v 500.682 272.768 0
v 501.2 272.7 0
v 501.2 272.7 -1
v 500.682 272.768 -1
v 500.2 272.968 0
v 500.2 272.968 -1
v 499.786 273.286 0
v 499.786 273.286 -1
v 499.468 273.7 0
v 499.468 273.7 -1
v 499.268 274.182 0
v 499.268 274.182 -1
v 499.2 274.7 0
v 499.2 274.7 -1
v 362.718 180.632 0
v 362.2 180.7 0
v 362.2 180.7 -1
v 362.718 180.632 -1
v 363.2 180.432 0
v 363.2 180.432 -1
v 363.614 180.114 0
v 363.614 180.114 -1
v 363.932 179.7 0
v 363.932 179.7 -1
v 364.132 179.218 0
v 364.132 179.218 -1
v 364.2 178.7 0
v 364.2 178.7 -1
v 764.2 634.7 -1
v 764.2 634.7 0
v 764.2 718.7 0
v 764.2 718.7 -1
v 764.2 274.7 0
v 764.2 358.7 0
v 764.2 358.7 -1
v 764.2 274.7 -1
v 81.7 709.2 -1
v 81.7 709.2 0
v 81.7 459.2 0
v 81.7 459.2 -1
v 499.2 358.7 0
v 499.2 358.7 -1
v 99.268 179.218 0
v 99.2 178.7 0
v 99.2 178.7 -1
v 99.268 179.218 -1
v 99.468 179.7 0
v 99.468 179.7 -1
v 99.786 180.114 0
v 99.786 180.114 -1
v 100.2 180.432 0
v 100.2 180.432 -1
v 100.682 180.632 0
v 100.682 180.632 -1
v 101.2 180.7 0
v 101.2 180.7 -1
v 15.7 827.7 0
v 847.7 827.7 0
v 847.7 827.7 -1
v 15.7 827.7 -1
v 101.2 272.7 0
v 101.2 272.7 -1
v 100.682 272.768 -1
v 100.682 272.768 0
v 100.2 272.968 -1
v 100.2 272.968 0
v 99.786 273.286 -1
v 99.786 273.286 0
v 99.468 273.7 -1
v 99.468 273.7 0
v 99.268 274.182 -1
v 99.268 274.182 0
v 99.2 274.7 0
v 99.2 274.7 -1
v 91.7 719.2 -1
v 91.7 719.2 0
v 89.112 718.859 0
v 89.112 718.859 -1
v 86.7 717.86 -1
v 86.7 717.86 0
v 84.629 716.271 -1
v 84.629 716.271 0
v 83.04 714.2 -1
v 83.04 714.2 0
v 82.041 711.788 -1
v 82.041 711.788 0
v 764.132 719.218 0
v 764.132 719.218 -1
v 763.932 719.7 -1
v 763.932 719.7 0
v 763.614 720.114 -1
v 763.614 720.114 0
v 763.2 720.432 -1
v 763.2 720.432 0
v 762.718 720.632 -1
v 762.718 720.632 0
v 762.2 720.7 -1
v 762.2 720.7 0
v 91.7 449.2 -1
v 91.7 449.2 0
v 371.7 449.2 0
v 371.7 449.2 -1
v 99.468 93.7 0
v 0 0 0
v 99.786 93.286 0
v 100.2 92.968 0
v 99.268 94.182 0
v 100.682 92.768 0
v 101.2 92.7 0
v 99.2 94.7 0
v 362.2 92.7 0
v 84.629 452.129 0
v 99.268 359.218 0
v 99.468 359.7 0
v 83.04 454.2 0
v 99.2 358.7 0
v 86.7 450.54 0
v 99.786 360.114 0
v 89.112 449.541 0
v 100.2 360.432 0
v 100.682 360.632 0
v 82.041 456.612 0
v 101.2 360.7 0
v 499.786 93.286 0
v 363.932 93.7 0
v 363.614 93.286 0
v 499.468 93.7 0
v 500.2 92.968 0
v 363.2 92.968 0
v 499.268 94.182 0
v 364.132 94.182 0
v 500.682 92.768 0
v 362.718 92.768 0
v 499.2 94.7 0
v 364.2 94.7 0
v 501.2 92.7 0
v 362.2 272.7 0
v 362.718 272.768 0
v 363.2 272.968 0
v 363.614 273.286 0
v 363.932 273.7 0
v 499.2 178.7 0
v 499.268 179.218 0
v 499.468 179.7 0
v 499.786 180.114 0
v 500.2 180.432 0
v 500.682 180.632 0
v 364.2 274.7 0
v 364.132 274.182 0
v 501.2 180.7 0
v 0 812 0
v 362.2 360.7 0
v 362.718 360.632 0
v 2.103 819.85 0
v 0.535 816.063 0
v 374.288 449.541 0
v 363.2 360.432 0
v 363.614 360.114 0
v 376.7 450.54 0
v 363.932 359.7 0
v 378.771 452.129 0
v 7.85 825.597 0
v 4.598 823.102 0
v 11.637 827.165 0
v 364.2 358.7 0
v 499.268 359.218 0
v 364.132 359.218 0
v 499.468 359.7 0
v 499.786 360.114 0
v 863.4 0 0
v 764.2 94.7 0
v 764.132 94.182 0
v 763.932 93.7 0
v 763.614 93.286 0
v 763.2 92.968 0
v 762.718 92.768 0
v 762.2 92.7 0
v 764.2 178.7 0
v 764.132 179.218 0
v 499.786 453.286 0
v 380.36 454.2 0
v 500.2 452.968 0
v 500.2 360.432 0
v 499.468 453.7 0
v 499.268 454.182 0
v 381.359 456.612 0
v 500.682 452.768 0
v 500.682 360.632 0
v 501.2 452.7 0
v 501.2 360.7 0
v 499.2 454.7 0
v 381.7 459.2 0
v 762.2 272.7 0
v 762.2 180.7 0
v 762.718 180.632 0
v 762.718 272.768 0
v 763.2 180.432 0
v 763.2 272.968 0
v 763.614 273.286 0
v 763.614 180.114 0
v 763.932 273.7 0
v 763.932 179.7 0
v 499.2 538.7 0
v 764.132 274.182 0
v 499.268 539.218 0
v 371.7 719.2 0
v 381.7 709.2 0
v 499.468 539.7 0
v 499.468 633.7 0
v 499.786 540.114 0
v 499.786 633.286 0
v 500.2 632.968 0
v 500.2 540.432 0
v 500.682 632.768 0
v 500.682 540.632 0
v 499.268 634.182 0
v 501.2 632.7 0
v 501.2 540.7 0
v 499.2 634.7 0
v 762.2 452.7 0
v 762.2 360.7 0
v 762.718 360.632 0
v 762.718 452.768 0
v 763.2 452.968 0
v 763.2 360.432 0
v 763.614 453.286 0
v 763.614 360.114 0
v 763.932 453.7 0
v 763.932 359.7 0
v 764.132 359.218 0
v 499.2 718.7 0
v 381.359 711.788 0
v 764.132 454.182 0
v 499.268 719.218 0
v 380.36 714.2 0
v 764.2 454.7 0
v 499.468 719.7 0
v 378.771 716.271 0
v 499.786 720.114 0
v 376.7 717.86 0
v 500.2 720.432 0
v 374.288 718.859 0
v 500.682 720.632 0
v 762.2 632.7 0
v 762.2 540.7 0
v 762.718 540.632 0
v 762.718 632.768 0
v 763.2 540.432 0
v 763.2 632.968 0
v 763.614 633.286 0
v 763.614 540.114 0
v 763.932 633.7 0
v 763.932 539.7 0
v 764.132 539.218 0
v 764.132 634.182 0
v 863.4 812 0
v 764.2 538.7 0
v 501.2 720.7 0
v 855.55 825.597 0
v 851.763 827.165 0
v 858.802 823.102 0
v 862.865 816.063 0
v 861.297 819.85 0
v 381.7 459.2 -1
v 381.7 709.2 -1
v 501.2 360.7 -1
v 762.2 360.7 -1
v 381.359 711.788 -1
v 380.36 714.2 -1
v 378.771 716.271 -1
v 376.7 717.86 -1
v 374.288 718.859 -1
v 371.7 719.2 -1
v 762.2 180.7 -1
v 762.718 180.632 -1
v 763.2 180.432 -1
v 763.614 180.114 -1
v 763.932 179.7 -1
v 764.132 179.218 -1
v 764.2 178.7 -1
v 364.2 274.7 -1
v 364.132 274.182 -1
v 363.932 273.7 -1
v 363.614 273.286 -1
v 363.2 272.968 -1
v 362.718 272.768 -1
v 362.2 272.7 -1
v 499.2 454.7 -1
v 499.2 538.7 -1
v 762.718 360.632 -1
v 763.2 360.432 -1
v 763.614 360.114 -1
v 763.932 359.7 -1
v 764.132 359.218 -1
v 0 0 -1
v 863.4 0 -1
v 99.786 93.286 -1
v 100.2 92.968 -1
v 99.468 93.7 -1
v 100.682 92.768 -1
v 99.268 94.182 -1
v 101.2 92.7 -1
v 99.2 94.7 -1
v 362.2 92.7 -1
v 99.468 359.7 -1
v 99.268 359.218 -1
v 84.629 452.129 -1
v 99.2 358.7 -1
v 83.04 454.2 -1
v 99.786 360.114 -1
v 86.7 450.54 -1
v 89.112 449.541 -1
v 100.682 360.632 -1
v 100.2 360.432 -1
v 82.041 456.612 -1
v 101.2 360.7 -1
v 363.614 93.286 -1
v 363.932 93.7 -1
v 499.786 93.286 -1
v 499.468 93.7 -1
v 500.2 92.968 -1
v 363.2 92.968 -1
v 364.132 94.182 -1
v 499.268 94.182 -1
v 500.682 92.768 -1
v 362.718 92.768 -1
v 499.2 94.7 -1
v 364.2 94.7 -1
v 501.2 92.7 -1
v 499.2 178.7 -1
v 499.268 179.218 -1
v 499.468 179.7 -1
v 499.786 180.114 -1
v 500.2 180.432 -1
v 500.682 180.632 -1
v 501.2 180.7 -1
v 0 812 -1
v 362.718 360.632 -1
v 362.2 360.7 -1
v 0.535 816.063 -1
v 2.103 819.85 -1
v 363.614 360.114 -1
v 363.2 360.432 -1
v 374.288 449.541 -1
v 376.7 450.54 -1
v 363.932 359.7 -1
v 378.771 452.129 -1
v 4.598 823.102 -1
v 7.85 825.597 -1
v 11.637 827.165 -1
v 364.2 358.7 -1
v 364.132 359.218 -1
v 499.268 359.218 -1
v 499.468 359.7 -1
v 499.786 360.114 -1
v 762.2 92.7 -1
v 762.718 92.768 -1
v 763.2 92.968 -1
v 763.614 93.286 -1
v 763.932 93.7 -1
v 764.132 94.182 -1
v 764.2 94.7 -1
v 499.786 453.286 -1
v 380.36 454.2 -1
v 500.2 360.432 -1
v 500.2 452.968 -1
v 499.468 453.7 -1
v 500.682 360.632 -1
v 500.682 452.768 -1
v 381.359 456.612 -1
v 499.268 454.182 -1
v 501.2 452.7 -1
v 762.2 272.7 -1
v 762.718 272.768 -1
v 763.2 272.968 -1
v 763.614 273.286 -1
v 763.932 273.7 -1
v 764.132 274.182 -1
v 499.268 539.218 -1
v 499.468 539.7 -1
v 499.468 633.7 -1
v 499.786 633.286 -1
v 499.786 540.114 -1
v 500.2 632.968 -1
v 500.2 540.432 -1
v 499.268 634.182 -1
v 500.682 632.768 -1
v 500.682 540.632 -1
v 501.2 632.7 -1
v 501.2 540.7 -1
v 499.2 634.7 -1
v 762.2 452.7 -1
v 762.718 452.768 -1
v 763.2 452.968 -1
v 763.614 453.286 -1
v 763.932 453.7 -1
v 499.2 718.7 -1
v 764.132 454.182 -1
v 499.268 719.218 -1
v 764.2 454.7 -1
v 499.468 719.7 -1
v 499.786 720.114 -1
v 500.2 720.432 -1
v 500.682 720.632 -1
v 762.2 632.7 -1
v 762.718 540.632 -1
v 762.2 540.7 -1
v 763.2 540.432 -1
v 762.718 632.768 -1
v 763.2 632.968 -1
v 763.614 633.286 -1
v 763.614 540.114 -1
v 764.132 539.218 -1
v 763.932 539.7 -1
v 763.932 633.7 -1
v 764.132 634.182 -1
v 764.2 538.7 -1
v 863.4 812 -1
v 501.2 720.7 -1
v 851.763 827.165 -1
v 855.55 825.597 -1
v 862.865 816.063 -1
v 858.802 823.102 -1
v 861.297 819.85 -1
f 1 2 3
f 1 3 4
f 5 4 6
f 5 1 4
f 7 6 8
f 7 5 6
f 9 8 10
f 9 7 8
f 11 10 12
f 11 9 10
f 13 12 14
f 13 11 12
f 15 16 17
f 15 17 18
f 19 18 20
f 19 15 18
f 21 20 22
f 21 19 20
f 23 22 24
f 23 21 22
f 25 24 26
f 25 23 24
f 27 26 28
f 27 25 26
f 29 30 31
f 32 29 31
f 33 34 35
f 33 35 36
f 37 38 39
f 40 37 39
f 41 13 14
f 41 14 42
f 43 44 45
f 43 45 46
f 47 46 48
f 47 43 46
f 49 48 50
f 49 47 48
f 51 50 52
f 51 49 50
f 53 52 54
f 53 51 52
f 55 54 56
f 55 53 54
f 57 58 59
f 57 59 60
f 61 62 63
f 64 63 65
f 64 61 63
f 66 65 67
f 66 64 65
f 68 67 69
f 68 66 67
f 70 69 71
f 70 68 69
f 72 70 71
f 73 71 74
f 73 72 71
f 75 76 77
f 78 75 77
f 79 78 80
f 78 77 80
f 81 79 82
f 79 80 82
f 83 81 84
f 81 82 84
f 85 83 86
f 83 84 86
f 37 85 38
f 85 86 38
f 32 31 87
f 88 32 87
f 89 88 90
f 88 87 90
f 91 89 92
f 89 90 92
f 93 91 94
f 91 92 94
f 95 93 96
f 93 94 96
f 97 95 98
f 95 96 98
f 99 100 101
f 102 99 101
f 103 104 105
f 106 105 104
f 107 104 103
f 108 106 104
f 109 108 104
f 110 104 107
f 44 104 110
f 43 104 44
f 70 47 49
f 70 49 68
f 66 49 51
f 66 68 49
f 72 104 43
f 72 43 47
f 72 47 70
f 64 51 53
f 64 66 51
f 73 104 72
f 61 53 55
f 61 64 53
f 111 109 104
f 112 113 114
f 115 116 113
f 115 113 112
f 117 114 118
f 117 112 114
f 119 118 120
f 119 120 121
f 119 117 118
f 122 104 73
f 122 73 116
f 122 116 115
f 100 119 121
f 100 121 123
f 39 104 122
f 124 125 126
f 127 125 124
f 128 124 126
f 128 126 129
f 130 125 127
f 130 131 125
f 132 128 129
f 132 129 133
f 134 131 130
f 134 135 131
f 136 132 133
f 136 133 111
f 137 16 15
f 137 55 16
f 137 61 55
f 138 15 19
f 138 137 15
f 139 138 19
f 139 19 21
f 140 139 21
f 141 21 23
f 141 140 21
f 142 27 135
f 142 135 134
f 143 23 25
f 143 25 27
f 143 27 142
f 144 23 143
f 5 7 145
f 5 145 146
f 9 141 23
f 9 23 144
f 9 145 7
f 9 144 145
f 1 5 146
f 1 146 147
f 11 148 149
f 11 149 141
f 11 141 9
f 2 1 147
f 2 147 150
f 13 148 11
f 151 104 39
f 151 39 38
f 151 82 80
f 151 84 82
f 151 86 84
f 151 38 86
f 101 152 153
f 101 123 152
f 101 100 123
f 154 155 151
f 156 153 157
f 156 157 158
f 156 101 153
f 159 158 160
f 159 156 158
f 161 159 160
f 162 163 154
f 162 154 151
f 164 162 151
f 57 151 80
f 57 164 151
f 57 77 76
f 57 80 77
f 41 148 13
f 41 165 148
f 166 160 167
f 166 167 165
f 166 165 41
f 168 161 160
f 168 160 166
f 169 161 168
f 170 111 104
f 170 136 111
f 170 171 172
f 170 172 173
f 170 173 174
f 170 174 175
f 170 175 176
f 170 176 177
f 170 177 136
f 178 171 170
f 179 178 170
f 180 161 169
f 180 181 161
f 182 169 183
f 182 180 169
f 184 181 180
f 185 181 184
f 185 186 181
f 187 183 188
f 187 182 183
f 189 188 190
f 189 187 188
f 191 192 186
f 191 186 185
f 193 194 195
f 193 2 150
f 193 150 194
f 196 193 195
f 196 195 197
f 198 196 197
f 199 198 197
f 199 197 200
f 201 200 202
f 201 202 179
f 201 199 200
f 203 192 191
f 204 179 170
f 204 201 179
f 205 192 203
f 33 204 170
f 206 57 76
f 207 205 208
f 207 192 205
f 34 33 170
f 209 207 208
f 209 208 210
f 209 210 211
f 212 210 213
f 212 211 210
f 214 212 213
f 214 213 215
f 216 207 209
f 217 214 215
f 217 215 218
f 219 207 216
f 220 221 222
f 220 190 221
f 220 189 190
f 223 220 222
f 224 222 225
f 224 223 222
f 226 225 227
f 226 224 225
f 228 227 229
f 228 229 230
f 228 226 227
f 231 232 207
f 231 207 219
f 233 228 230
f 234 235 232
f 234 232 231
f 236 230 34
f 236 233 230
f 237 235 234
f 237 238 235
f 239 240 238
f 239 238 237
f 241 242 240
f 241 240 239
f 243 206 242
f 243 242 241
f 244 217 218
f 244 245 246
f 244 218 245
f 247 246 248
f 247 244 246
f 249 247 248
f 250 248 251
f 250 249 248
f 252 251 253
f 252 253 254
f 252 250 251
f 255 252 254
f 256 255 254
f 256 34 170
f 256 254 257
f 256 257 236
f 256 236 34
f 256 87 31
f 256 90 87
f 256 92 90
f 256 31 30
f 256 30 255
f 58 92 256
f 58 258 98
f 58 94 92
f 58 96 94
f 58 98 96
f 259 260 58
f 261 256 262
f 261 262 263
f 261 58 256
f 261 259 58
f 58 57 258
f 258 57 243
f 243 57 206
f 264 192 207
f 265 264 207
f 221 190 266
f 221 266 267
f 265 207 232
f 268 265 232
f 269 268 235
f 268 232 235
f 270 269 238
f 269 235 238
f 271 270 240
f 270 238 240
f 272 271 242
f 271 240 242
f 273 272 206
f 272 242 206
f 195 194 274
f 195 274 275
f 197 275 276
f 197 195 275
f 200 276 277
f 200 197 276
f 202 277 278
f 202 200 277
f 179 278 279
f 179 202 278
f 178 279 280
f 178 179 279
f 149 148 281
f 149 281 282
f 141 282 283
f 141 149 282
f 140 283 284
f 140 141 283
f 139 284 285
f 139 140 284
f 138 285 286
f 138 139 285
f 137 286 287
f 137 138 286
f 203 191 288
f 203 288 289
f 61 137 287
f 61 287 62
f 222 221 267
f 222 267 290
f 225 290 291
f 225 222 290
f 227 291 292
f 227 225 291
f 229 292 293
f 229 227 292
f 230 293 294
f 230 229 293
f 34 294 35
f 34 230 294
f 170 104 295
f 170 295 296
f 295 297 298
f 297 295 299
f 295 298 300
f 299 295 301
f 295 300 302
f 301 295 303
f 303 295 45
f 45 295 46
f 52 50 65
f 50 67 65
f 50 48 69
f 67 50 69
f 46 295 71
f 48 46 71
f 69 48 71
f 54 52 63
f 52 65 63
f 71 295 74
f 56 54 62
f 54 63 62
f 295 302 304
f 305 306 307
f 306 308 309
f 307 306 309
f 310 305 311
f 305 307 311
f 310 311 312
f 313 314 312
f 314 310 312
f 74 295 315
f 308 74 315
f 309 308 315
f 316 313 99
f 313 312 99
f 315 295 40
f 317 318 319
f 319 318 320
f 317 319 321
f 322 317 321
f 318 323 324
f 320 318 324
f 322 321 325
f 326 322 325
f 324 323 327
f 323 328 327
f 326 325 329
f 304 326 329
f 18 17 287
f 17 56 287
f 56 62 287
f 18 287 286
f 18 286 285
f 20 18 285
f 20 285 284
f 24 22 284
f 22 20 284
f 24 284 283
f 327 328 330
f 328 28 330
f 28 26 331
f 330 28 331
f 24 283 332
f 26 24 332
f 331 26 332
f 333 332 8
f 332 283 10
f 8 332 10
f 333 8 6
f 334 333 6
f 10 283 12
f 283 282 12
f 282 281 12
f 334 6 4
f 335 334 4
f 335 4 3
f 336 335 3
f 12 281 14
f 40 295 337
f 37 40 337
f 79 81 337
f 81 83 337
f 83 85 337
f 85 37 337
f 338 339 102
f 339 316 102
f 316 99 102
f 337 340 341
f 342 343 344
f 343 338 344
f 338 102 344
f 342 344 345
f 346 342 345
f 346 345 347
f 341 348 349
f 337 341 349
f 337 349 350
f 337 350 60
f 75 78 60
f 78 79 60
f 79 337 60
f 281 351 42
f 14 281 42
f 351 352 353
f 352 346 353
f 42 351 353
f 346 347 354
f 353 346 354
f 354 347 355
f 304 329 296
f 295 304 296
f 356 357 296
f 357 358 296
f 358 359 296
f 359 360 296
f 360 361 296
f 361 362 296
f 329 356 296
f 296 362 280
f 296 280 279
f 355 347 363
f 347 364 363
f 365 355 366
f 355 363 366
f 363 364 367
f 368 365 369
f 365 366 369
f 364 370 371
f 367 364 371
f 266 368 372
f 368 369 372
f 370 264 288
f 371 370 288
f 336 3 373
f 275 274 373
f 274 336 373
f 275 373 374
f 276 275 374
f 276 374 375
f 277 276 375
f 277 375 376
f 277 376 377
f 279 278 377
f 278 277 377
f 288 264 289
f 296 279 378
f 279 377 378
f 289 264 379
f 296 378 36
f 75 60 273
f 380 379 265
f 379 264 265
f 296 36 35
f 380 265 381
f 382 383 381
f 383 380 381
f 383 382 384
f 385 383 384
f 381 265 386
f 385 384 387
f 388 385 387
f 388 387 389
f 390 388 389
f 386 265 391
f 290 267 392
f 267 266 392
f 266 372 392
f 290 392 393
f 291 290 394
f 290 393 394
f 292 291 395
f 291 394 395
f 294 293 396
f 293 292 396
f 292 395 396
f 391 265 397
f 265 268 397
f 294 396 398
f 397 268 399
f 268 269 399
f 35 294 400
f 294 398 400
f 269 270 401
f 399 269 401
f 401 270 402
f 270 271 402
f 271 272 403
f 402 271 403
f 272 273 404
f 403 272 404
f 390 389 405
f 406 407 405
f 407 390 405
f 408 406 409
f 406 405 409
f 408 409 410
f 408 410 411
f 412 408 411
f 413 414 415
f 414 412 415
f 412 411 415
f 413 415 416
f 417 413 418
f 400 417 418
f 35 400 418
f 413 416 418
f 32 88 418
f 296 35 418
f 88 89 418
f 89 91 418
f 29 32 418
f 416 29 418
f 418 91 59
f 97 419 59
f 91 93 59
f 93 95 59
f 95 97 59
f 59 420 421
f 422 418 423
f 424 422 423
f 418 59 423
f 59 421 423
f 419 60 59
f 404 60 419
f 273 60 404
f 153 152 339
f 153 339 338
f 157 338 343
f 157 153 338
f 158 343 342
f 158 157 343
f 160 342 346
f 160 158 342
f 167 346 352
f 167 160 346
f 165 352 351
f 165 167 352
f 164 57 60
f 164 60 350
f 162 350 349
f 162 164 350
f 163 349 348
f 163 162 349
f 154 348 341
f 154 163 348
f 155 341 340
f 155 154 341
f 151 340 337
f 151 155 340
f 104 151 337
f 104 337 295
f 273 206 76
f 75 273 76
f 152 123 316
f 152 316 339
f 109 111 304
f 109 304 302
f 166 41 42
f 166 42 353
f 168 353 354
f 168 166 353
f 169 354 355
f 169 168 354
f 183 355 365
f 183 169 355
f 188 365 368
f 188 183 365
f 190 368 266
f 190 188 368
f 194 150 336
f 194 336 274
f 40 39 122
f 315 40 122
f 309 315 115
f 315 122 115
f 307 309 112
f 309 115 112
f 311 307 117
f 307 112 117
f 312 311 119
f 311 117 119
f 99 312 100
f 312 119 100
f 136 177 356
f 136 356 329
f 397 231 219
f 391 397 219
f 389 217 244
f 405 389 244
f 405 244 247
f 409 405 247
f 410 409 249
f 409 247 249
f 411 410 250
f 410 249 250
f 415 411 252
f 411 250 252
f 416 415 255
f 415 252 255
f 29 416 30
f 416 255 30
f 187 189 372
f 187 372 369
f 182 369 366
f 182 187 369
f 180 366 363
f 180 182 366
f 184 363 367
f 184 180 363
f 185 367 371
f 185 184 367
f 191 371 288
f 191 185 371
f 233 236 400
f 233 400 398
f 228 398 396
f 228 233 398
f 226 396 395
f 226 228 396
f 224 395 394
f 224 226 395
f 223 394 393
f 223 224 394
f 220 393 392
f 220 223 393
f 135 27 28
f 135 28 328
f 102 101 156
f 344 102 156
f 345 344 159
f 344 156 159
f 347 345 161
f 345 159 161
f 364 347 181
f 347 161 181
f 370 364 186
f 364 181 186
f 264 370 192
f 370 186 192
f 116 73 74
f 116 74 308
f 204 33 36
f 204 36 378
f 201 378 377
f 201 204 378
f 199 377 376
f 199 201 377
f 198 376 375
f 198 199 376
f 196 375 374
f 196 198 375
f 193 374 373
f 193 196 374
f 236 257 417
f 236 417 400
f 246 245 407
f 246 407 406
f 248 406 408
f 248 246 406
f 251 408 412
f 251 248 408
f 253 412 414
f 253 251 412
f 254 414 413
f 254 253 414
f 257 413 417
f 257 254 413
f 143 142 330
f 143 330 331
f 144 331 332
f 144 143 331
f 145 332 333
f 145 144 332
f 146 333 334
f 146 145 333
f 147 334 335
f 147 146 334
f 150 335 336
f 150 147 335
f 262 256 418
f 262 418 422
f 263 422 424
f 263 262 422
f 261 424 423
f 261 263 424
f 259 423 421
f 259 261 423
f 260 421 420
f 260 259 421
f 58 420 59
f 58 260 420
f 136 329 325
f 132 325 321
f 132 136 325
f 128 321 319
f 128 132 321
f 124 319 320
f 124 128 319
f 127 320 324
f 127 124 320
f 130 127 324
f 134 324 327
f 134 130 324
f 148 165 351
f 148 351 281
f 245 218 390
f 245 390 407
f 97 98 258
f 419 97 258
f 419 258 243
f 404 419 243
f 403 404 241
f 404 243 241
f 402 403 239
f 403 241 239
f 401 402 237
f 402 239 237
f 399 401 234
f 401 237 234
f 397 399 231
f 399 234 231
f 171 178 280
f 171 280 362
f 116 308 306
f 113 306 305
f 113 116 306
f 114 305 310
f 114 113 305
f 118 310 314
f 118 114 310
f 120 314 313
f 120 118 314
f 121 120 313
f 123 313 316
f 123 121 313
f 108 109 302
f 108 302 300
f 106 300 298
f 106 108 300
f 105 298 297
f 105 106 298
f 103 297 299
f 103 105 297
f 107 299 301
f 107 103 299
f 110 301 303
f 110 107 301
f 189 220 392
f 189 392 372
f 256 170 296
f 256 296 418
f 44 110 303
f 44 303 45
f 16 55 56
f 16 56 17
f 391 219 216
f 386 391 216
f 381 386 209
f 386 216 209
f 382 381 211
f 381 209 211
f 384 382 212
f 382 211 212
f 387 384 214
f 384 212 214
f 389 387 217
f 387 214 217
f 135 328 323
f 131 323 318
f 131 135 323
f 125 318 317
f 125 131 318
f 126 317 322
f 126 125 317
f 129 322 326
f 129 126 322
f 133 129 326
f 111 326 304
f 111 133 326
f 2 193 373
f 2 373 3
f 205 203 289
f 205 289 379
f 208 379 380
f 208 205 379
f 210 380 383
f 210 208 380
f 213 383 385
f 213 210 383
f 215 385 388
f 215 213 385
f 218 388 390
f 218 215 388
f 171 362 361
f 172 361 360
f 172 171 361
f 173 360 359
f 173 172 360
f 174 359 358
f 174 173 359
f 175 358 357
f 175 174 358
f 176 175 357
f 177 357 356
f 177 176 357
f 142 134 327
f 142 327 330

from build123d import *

# Parameters (mm, degrees)
BASE_FLANGE1_DEPTH = 1
CUT_EXTRUDE1_DEPTH = 10
CUT_EXTRUDE2_DEPTH = 10


# Sheet-metal steps are written as plain solids
with BuildPart() as part:
    # Sketch1 → Base-Flange1 (new body)
    with BuildSketch(Plane.XY):
        with BuildLine():
            Line((0, 0), (863.4, 0))
            Line((863.4, 0), (863.4, 812))
            ThreePointArc((863.4, 812), (858.801576465, 823.101576465), (847.7, 827.7))
            Line((847.7, 827.7), (15.7, 827.7))
            ThreePointArc((15.7, 827.7), (4.598423535, 823.101576465), (0, 812))
            Line((0, 812), (0, 0))
        make_face()
    extrude(amount=-BASE_FLANGE1_DEPTH)

    # Sketch9 → Cut-Extrude1 (cut)
    with BuildSketch(Plane.XY):
        with BuildLine():
            Line((762.2, 720.7), (501.2, 720.7))
            ThreePointArc((501.2, 720.7), (499.785786438, 720.114213562), (499.2, 718.7))
            Line((499.2, 718.7), (499.2, 634.7))
            ThreePointArc((499.2, 634.7), (499.785786438, 633.285786438), (501.2, 632.7))
            Line((501.2, 632.7), (762.2, 632.7))
            ThreePointArc((762.2, 632.7), (763.614213562, 633.285786438), (764.2, 634.7))
            Line((764.2, 634.7), (764.2, 718.7))
            ThreePointArc((764.2, 718.7), (763.614213562, 720.114213562), (762.2, 720.7))
        make_face()
        with BuildLine():
            Line((764.2, 538.7), (764.2, 454.7))
            ThreePointArc((764.2, 454.7), (763.614213562, 453.285786438), (762.2, 452.7))
            Line((762.2, 452.7), (501.2, 452.7))
            ThreePointArc((501.2, 452.7), (499.785786438, 453.285786438), (499.2, 454.7))
            Line((499.2, 454.7), (499.2, 538.7))
            ThreePointArc((499.2, 538.7), (499.785786438, 540.114213562), (501.2, 540.7))
            Line((501.2, 540.7), (762.2, 540.7))
            ThreePointArc((762.2, 540.7), (763.614213562, 540.114213562), (764.2, 538.7))
        make_face()
        with BuildLine():
            Line((764.2, 358.7), (764.2, 274.7))
            ThreePointArc((764.2, 274.7), (763.614213562, 273.285786438), (762.2, 272.7))
            Line((762.2, 272.7), (501.2, 272.7))
            ThreePointArc((501.2, 272.7), (499.785786438, 273.285786438), (499.2, 274.7))
            Line((499.2, 274.7), (499.2, 358.7))
            ThreePointArc((499.2, 358.7), (499.785786438, 360.114213562), (501.2, 360.7))
            Line((501.2, 360.7), (762.2, 360.7))
            ThreePointArc((762.2, 360.7), (763.614213562, 360.114213562), (764.2, 358.7))
        make_face()
        with BuildLine():
            Line((764.2, 178.7), (764.2, 94.7))
            ThreePointArc((764.2, 94.7), (763.614213562, 93.285786438), (762.2, 92.7))
            Line((762.2, 92.7), (501.2, 92.7))
            ThreePointArc((501.2, 92.7), (499.785786438, 93.285786438), (499.2, 94.7))
            Line((499.2, 94.7), (499.2, 178.7))
            ThreePointArc((499.2, 178.7), (499.785786438, 180.114213562), (501.2, 180.7))
            Line((501.2, 180.7), (762.2, 180.7))
            ThreePointArc((762.2, 180.7), (763.614213562, 180.114213562), (764.2, 178.7))
        make_face()
        with BuildLine():
            Line((364.2, 358.7), (364.2, 274.7))
            ThreePointArc((364.2, 274.7), (363.614213562, 273.285786438), (362.2, 272.7))
            Line((362.2, 272.7), (101.2, 272.7))
            ThreePointArc((101.2, 272.7), (99.785786438, 273.285786438), (99.2, 274.7))
            Line((99.2, 274.7), (99.2, 358.7))
            ThreePointArc((99.2, 358.7), (99.785786438, 360.114213562), (101.2, 360.7))
            Line((101.2, 360.7), (362.2, 360.7))
            ThreePointArc((362.2, 360.7), (363.614213562, 360.114213562), (364.2, 358.7))
        make_face()
        with BuildLine():
            Line((364.2, 178.7), (364.2, 94.7))
            ThreePointArc((364.2, 94.7), (363.614213562, 93.285786438), (362.2, 92.7))
            Line((362.2, 92.7), (101.2, 92.7))
            ThreePointArc((101.2, 92.7), (99.785786438, 93.285786438), (99.2, 94.7))
            Line((99.2, 94.7), (99.2, 178.7))
            ThreePointArc((99.2, 178.7), (99.785786438, 180.114213562), (101.2, 180.7))
            Line((101.2, 180.7), (362.2, 180.7))
            ThreePointArc((362.2, 180.7), (363.614213562, 180.114213562), (364.2, 178.7))
        make_face()
    extrude(amount=-CUT_EXTRUDE1_DEPTH, mode=Mode.SUBTRACT)

    # Sketch10 → Cut-Extrude2 (cut)
    with BuildSketch(Plane.XY):
        with BuildLine():
            Line((91.7, 449.2), (371.7, 449.2))
            ThreePointArc((371.7, 449.2), (378.771067812, 452.128932188), (381.7, 459.2))
            Line((381.7, 459.2), (381.7, 709.2))
            ThreePointArc((381.7, 709.2), (378.771067812, 716.271067812), (371.7, 719.2))
            Line((371.7, 719.2), (91.7, 719.2))
            ThreePointArc((91.7, 719.2), (84.628932188, 716.271067812), (81.7, 709.2))
            Line((81.7, 709.2), (81.7, 459.2))
            ThreePointArc((81.7, 459.2), (84.628932188, 452.128932188), (91.7, 449.2))
        make_face()
    extrude(amount=-CUT_EXTRUDE2_DEPTH, mode=Mode.SUBTRACT)


solid = part.part
